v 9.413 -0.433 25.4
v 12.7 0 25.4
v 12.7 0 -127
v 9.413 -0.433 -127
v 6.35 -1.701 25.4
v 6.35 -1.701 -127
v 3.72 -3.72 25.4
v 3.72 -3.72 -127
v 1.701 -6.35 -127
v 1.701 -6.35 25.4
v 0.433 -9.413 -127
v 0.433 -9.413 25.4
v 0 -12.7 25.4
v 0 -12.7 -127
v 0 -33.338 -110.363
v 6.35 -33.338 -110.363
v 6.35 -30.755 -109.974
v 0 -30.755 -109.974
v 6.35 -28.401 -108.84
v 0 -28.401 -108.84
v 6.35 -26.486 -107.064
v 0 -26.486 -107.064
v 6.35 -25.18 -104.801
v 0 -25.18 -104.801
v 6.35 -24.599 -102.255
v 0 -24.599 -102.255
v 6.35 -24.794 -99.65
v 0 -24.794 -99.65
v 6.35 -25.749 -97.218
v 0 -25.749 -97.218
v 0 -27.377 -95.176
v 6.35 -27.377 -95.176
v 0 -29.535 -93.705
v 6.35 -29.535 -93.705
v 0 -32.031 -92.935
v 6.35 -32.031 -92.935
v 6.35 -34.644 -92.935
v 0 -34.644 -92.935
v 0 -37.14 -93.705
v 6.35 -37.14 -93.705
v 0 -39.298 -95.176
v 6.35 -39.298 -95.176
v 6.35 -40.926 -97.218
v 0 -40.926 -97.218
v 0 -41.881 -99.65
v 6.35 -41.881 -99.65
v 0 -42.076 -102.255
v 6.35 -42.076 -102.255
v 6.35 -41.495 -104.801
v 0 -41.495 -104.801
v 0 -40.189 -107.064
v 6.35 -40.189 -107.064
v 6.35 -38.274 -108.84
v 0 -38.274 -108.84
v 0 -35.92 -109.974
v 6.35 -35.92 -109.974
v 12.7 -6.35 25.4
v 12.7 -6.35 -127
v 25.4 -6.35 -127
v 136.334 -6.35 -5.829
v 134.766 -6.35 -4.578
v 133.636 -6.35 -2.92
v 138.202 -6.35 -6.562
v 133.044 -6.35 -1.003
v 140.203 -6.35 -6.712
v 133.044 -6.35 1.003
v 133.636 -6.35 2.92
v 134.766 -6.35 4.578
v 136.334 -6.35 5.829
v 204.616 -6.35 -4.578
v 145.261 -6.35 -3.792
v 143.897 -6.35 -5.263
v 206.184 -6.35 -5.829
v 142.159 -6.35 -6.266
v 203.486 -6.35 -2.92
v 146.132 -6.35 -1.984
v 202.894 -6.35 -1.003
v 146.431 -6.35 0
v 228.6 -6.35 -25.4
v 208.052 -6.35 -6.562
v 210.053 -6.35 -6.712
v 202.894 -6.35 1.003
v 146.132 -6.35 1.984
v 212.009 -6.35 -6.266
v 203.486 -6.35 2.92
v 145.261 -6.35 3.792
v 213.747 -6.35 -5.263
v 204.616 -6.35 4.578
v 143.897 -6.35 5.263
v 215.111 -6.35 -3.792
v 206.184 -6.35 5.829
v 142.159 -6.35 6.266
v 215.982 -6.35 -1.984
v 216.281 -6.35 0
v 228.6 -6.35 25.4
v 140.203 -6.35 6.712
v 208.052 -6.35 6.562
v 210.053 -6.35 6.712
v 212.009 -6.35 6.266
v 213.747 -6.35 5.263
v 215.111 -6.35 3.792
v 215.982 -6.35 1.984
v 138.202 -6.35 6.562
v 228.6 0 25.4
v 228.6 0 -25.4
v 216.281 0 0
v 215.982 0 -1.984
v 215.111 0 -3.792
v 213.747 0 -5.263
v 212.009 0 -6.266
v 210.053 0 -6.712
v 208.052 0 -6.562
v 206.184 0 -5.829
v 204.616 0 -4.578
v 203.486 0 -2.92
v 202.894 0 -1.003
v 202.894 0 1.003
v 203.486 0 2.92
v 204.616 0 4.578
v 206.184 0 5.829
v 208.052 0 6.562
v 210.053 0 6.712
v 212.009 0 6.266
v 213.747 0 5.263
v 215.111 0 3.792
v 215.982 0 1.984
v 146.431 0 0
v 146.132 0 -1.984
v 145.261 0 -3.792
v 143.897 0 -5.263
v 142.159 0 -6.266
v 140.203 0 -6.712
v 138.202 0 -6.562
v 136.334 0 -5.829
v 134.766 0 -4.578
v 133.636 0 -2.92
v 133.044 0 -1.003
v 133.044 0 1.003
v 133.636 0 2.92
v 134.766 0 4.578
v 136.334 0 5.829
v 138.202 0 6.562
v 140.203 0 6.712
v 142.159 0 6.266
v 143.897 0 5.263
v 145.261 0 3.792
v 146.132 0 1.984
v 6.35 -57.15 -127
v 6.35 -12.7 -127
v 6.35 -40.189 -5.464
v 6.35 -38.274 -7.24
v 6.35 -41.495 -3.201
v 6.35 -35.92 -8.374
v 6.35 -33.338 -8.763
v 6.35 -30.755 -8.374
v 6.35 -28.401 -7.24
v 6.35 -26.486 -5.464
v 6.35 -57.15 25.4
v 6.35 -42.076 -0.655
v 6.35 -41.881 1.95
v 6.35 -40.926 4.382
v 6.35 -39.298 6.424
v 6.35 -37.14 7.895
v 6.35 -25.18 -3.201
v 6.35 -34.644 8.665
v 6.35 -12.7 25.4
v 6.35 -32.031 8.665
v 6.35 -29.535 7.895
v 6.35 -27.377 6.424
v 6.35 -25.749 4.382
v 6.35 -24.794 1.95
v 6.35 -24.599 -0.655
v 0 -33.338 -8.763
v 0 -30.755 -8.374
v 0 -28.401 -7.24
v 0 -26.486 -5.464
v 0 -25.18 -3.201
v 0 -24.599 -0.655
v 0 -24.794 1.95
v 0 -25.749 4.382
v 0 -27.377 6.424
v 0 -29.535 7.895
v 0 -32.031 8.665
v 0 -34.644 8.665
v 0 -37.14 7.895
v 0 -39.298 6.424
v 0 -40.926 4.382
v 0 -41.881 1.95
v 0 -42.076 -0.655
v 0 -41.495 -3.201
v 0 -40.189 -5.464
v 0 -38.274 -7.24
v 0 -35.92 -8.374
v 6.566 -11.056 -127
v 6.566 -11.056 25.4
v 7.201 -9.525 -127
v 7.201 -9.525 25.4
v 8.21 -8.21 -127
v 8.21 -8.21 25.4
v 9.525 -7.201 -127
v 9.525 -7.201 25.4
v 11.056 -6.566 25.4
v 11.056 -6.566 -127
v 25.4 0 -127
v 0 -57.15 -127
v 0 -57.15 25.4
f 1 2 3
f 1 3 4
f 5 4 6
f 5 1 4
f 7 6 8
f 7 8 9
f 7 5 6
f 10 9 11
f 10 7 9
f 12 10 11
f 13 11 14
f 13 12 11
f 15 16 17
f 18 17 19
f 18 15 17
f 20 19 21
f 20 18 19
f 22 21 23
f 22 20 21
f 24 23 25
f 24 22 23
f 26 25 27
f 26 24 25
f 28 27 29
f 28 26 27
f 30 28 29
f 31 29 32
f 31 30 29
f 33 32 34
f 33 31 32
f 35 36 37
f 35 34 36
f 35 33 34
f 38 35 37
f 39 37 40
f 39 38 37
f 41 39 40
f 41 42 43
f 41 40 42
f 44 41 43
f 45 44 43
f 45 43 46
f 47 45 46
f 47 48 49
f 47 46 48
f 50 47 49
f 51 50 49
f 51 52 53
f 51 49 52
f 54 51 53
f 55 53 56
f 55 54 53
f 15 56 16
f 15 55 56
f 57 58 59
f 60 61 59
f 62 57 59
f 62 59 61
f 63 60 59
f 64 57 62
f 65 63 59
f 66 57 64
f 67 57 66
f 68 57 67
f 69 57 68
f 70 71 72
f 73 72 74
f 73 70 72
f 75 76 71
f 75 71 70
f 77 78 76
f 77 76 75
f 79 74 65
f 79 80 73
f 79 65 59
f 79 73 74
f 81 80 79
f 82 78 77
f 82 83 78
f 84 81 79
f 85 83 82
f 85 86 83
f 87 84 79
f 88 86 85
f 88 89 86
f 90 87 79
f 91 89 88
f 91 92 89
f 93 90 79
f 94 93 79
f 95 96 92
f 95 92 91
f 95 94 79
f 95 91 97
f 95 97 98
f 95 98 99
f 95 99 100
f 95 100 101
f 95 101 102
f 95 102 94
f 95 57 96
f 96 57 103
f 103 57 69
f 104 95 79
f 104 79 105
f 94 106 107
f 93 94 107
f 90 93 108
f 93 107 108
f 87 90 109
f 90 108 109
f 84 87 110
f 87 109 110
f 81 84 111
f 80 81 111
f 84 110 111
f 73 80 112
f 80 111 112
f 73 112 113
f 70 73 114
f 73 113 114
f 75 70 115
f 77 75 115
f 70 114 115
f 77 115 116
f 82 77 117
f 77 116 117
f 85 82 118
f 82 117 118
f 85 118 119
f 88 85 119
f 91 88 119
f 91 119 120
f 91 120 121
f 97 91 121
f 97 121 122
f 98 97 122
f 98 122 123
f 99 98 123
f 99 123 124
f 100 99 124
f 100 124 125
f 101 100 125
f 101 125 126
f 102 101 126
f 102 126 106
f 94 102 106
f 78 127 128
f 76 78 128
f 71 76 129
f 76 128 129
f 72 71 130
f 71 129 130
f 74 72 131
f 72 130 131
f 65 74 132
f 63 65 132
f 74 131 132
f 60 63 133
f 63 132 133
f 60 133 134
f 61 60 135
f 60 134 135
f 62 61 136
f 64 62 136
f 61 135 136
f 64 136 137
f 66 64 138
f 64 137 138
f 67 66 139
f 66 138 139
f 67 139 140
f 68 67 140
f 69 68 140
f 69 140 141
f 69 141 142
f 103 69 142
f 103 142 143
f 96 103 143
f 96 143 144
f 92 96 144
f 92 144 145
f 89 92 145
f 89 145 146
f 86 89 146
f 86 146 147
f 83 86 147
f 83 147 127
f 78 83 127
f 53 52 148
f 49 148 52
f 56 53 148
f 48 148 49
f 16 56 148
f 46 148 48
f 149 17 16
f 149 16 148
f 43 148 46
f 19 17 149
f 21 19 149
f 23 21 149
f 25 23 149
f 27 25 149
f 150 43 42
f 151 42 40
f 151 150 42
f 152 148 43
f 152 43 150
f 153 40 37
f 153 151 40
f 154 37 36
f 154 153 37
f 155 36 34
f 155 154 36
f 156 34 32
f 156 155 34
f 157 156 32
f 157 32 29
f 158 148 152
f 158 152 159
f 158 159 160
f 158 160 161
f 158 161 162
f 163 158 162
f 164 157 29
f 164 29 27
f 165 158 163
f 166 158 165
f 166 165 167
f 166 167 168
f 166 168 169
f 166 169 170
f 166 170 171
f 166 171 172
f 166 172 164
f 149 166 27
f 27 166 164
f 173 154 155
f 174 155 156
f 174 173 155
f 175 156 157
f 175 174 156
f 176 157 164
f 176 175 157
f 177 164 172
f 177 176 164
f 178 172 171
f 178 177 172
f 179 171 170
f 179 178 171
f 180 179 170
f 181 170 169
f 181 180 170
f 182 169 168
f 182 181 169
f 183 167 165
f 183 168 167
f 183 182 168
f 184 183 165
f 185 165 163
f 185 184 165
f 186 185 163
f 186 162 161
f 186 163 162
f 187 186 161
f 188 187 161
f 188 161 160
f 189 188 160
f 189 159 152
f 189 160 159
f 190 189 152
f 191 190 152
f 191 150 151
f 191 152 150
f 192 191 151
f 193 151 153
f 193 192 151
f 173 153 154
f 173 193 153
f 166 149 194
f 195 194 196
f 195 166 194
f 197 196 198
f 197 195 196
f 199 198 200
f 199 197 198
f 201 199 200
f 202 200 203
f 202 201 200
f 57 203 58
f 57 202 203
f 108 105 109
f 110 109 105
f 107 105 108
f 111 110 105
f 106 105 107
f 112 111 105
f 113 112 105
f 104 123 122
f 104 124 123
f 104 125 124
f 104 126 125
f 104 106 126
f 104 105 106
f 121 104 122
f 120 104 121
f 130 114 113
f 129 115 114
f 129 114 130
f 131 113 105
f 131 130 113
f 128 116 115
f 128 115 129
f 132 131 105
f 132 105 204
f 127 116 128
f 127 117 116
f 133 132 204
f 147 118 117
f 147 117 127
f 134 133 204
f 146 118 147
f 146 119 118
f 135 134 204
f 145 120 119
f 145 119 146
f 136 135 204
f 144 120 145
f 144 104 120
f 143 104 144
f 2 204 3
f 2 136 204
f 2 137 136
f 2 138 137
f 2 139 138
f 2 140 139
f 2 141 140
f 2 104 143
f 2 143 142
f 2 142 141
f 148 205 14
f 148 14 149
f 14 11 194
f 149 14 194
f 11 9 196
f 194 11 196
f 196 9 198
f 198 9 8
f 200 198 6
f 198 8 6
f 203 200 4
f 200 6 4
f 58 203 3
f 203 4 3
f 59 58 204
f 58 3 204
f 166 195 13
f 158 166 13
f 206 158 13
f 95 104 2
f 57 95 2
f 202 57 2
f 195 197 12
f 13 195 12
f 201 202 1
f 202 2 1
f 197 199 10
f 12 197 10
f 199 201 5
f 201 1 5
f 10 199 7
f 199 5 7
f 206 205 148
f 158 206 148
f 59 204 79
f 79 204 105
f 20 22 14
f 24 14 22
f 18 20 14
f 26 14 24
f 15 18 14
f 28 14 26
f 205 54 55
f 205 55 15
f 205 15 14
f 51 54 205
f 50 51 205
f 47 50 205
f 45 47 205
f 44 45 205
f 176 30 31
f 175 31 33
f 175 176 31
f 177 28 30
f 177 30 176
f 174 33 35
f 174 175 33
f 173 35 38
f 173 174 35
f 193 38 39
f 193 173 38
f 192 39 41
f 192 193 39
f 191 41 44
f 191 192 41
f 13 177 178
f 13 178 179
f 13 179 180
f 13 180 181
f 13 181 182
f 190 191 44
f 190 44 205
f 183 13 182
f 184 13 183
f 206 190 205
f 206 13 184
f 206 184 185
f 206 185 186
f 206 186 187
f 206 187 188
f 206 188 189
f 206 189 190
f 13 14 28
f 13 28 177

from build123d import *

# Parameters (mm, degrees)
EXTRUDE1_DEPTH         = 127
SKETCH2_R              = 6.731
CUT_CHAMFER_DEPTH      = 508
CUT_CHAMFER_DEPTH_BACK = 58.15
SKETCH3_R              = 8.763
CUT_HOLES_DEPTH        = 229.6
CUT_LH_DEPTH           = 1
CUT_LH_DEPTH_BACK      = 58.15


with BuildPart() as part:
    # Sketch1 → Extrude1 (new body, symmetric)
    with BuildSketch(Plane.XY):
        with BuildLine():
            Line((228.6, 0), (12.7, 0))
            ThreePointArc((12.7, 0), (3.719743879, -3.719743879), (0, -12.7))
            Line((0, -12.7), (0, -57.15))
            Line((0, -57.15), (6.35, -57.15))
            Line((6.35, -57.15), (6.35, -12.7))
            ThreePointArc((6.35, -12.7), (8.209871939, -8.209871939), (12.7, -6.35))
            Line((12.7, -6.35), (228.6, -6.35))
            Line((228.6, -6.35), (228.6, 0))
        make_face()
    extrude(amount=EXTRUDE1_DEPTH, both=True)

    # Sketch2 → Cut-Chamfer (cut, two sides)
    with BuildSketch(Plane(origin=(0, 0, 0), x_dir=(1, 0, 0), z_dir=(0, 1, 0))) as cut_chamfer_sk:
        with Locations((209.55, 0)):
            Circle(SKETCH2_R)
        with Locations((139.7, 0)):
            Circle(SKETCH2_R)
        Polygon((25.4, 127), (228.6, 25.4), (228.6, 127), align=None)
        Polygon((25.4, -127), (228.6, -25.4), (228.6, -127), align=None)
    extrude(amount=CUT_CHAMFER_DEPTH, mode=Mode.SUBTRACT)
    extrude(cut_chamfer_sk.sketch, amount=-CUT_CHAMFER_DEPTH_BACK, mode=Mode.SUBTRACT)

    # Sketch3 → Cut-Holes (cut, through all)
    with BuildSketch(Plane(origin=(0, 0, 0), x_dir=(0, 0, -1), z_dir=(1, 0, 0))):
        with Locations((0, -33.3375)):
            Circle(SKETCH3_R)
        with Locations((101.6, -33.3375)):
            Circle(SKETCH3_R)
        with Locations((0, -153.9875)):
            Circle(SKETCH3_R)
        with Locations((101.6, -153.9875)):
            Circle(SKETCH3_R)
        with Locations((-101.6, -33.3375)):
            Circle(SKETCH3_R)
        with Locations((-101.6, -153.9875)):
            Circle(SKETCH3_R)
    extrude(amount=CUT_HOLES_DEPTH, mode=Mode.SUBTRACT)

    # Sketch5 → Cut-LH (cut, two sides)
    with BuildSketch(Plane(origin=(0, 0, 0), x_dir=(1, 0, 0), z_dir=(0, 1, 0))) as cut_lh_sk:
        Polygon((788.086014381, -25.4), (228.6, -25.4), (0, -25.4), (-559.486014381, -25.4), (-559.486014381, -1144.372028761), (788.086014381, -1144.372028761), align=None)
    extrude(amount=CUT_LH_DEPTH, mode=Mode.SUBTRACT)
    extrude(cut_lh_sk.sketch, amount=-CUT_LH_DEPTH_BACK, mode=Mode.SUBTRACT)


solid = part.part
